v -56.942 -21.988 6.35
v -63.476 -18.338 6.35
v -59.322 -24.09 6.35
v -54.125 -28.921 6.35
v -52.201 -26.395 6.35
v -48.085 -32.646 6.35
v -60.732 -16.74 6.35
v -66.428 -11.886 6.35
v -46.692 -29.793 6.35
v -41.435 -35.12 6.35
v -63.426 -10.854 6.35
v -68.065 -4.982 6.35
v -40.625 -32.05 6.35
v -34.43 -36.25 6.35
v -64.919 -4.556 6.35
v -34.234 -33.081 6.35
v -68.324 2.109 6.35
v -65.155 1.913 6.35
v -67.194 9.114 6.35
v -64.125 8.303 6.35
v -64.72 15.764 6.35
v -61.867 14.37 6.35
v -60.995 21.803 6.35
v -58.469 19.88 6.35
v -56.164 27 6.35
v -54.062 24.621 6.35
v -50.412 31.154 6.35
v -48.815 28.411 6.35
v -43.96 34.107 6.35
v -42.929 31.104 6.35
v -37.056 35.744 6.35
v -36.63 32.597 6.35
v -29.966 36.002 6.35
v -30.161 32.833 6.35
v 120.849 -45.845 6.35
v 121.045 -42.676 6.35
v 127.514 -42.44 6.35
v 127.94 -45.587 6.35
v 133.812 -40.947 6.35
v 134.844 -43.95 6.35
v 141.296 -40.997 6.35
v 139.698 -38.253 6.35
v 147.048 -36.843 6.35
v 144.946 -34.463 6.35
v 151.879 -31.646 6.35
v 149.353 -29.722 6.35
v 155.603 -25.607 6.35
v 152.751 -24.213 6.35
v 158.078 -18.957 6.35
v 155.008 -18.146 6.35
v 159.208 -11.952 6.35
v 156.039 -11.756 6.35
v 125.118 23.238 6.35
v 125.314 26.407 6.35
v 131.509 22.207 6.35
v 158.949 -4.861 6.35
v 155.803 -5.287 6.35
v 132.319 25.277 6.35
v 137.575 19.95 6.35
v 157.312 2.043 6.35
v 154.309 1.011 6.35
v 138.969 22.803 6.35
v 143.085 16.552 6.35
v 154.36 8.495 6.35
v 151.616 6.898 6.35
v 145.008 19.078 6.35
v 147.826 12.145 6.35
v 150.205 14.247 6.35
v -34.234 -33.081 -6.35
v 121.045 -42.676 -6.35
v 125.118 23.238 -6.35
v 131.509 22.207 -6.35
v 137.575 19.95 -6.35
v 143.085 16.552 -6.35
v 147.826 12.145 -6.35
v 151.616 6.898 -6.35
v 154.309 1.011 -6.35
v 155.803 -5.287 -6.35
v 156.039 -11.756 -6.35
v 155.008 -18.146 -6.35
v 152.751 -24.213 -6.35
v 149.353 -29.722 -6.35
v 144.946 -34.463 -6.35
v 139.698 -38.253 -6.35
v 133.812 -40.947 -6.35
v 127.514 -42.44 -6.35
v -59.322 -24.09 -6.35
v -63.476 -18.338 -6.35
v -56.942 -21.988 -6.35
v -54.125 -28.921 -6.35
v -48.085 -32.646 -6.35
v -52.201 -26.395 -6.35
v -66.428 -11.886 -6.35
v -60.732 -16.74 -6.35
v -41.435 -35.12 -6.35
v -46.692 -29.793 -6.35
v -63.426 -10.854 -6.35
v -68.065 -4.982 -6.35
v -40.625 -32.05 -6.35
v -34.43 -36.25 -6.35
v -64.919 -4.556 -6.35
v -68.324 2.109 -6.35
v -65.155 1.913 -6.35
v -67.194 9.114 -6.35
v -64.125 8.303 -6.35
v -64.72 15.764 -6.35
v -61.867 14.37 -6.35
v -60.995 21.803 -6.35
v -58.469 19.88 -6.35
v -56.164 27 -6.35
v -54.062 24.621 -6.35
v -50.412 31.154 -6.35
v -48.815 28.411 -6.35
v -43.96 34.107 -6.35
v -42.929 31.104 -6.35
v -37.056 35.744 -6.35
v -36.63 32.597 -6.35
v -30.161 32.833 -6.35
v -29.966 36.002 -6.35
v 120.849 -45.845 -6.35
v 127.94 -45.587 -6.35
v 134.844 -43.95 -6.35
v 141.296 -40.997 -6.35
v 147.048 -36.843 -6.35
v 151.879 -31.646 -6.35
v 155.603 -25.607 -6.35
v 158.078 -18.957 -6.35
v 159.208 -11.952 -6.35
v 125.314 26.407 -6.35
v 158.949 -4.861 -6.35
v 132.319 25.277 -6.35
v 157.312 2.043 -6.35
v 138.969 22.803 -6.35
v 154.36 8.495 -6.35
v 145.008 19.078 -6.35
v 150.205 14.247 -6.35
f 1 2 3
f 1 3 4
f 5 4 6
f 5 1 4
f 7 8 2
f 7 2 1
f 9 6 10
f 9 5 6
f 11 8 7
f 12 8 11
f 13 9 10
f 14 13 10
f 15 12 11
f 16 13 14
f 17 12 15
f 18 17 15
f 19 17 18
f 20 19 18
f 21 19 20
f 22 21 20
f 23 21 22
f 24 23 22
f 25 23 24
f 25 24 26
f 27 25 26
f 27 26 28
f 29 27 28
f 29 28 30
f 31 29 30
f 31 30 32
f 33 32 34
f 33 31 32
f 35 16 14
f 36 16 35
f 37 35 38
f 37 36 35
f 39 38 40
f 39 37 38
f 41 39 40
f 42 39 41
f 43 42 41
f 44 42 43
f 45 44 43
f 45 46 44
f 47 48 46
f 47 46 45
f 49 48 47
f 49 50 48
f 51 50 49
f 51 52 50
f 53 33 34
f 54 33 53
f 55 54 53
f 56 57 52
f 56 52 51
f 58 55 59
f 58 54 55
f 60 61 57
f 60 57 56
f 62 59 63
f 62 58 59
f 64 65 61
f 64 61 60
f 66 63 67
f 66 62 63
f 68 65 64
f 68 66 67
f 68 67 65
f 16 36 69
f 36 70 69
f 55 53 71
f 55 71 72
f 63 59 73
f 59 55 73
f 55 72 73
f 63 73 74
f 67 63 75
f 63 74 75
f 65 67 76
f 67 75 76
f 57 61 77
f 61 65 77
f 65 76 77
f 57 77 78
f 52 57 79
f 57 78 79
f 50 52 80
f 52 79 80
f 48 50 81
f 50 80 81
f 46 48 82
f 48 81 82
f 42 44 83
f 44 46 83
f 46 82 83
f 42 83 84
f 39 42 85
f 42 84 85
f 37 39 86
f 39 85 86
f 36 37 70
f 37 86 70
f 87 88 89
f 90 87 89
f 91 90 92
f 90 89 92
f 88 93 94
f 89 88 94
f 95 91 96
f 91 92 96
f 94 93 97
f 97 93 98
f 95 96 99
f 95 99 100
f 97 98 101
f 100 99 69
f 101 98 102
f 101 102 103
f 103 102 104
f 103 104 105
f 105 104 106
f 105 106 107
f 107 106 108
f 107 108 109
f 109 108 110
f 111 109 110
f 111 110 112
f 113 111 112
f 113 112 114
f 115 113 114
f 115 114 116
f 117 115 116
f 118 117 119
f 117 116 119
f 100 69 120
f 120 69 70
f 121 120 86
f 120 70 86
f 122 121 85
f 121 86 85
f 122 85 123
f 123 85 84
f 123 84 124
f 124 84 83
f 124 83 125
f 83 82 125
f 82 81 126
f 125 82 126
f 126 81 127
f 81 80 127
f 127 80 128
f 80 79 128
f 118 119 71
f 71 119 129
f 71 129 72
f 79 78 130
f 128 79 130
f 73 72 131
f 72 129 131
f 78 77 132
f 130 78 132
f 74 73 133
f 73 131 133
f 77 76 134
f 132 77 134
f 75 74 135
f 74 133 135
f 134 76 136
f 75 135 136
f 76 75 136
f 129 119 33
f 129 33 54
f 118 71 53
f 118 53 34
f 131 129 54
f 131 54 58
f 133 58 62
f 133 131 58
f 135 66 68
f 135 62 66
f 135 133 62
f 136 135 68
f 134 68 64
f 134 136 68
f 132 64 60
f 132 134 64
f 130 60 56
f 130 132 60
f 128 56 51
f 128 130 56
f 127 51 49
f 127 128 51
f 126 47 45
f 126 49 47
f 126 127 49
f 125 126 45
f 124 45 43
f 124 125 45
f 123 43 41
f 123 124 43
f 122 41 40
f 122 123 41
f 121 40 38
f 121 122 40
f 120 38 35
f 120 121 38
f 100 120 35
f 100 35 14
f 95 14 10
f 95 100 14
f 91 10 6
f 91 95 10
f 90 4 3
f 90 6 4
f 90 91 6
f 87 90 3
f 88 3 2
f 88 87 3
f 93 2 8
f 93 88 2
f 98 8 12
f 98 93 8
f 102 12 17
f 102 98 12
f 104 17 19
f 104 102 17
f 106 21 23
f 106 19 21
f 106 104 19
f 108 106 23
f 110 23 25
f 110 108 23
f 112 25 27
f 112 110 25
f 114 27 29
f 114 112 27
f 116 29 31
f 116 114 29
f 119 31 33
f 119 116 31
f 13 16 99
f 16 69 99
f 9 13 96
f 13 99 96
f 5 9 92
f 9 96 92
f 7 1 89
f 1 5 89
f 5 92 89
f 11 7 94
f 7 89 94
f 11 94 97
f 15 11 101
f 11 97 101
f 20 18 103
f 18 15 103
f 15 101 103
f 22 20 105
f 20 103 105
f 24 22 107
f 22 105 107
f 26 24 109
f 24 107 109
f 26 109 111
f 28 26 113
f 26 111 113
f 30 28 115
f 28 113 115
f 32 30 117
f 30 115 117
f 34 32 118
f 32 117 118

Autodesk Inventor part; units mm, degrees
ref_plane "YZ Plane" through (0, 0, 0) normal (1, 0, 0) x (0, 1, 0)
ref_plane "XZ Plane" through (0, 0, 0) normal (0, 1, 0) x (-1, 0, 0)
ref_plane "XY Plane" through (0, 0, 0) normal (0, 0, 1) x (1, 0, 0)
sketch "Sketch1" plane through (0, 0, 0) normal (0, 0, 1) x (1, 0, 0)
  circle A0 centre (-32.198, -0.1238) radius 50.8 projected
  circle A1 centre (123.0816, -9.7192) radius 50.8 projected
  arc A2 (-30.1614, 32.8334) -> (-34.2345, -33.0809) centre (-32.198, -0.1238) ccw
  arc A3 (121.045, -42.6763) -> (125.1181, 23.238) centre (123.0816, -9.7192) ccw
  line L0 (121.045, -42.6763) -> (-34.2345, -33.0809)
  line L1 (125.1181, 23.238) -> (-30.1614, 32.8334)
  arc A4 (120.8492, -45.8453) -> (125.314, 26.4069) centre (123.0816, -9.7192) ccw
  line L2 (120.8492, -45.8453) -> (-34.4304, -36.2499)
  arc A5 (-29.9656, 36.0023) -> (-34.4304, -36.2499) centre (-32.198, -0.1238) ccw
  line L3 (-29.9656, 36.0023) -> (125.314, 26.4069)
  point P0 (0, 0)
  dimension "d0" = 66.04
  dimension "d1" = 66.04
  dimension "d2" = 3.175
extrude "Extrusion1" add sketch "Sketch1" along normal mid plane 12.7 contours L1 A2 L0 A0 L2 A5 L3 | A0 L3 A1 L1 | L0 A1 L2 A0 | A1 L3 A4 L2 L0 A3 L1
properties part number "Belt"
